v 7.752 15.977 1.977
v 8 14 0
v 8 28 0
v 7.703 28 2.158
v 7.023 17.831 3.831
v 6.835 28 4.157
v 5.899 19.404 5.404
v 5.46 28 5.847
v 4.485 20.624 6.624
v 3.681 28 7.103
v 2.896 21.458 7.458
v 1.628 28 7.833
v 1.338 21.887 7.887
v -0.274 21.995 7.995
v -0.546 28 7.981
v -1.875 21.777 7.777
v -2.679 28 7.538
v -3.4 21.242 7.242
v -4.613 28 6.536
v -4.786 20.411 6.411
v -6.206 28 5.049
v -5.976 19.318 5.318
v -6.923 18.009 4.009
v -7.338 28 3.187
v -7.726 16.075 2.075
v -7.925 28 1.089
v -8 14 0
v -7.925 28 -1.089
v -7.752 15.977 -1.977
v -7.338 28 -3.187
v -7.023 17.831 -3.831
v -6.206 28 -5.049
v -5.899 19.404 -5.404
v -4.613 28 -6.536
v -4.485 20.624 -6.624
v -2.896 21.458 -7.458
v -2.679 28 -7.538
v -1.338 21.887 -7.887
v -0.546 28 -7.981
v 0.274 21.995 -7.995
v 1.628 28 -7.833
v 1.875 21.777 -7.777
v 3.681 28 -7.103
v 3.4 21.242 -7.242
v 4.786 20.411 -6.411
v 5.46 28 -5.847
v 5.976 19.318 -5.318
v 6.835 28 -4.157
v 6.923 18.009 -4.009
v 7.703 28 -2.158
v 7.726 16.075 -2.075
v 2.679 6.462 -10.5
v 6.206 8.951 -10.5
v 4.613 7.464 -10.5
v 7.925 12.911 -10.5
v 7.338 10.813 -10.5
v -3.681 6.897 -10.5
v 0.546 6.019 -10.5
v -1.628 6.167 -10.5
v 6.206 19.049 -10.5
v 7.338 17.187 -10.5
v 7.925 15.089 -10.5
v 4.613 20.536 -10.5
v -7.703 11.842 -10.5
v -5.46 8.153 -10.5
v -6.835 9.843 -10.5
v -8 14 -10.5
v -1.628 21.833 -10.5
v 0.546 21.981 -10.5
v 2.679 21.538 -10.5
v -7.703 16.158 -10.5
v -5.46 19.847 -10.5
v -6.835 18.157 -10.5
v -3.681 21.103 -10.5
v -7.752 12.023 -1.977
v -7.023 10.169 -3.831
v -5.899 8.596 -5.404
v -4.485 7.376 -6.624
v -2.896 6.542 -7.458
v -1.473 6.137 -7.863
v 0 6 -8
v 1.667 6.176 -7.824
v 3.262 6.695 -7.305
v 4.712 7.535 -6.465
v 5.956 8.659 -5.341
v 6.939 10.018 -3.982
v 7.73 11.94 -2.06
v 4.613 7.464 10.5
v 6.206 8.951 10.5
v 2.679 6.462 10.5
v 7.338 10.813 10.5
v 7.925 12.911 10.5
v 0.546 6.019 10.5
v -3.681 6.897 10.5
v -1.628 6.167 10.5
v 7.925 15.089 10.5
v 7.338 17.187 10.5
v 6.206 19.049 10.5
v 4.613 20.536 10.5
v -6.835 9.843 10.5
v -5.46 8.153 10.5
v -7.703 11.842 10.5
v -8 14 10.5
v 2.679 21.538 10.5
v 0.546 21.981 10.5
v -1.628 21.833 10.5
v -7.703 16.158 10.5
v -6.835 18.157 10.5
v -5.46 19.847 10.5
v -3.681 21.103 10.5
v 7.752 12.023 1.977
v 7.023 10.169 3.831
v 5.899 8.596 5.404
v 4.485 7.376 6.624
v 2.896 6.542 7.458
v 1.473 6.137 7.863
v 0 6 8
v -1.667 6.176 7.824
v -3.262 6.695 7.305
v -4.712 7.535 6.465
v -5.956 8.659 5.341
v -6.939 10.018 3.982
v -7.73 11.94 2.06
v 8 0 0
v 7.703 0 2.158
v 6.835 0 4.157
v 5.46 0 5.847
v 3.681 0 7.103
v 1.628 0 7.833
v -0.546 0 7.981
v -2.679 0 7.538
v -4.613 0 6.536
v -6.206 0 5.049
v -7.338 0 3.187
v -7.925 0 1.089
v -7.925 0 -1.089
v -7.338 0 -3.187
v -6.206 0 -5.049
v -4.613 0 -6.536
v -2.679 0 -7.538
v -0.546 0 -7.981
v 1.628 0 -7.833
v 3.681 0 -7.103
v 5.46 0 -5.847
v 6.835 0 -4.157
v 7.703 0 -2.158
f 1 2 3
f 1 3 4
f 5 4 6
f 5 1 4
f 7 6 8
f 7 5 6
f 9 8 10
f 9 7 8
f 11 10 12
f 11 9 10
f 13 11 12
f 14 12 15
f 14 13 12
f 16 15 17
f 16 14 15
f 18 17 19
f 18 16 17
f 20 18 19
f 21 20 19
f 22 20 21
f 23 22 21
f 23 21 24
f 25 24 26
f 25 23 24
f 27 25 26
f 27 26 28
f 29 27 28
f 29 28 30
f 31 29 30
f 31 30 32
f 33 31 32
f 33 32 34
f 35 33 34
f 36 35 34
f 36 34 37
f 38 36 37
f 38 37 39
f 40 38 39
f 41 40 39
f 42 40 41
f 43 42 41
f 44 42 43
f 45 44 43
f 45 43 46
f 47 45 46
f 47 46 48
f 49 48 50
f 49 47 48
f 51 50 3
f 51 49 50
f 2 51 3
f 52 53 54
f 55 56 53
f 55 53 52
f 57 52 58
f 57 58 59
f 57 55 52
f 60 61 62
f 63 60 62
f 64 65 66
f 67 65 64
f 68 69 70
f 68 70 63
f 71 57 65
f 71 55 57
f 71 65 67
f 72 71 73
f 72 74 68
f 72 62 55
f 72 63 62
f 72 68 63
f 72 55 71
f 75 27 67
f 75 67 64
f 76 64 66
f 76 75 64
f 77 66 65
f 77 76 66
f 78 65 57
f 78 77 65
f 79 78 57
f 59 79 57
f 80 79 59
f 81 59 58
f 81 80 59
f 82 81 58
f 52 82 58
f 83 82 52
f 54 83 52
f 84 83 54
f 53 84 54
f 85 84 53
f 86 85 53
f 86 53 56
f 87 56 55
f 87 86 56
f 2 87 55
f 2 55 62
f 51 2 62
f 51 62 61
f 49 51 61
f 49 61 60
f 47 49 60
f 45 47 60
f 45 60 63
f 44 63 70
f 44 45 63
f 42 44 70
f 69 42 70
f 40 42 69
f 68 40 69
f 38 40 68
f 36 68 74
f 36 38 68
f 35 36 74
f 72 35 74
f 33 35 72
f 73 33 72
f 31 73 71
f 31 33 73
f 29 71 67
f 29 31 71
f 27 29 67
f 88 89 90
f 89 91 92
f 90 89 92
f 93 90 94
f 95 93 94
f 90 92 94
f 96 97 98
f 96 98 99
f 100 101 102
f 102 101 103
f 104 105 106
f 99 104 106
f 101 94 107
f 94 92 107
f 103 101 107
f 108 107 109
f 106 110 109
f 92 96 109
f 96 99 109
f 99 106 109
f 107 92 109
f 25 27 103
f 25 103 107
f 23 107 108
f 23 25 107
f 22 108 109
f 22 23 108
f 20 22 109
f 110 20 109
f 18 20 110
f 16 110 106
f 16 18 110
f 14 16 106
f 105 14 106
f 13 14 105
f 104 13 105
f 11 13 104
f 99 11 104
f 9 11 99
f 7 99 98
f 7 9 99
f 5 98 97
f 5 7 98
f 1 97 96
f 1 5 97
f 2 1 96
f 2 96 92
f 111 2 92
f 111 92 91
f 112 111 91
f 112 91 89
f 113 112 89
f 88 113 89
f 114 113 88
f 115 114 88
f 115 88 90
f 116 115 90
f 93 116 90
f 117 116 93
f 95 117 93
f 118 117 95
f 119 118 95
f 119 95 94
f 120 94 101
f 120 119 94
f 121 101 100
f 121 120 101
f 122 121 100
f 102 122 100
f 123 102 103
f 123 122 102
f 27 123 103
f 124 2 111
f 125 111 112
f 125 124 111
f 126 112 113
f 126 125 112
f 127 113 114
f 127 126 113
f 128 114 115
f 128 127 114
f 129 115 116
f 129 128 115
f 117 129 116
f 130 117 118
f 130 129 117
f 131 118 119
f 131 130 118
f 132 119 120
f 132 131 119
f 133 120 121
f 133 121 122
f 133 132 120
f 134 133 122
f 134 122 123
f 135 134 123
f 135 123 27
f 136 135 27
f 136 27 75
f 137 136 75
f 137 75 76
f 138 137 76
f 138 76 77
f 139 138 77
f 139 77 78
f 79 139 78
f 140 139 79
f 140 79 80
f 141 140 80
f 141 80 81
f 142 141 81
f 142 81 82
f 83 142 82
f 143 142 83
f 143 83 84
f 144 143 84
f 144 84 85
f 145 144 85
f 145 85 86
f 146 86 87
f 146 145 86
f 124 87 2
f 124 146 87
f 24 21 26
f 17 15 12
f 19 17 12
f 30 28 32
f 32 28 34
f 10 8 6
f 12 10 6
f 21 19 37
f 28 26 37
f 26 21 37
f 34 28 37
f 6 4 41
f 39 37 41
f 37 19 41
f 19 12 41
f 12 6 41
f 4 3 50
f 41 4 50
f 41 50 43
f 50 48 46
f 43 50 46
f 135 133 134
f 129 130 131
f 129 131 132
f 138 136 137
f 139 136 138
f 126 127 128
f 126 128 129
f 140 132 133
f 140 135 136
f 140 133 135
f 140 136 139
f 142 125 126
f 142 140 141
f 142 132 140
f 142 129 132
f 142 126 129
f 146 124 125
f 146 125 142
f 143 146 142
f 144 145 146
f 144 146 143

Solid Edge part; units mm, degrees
sketch "Sketch1" plane through (0, 0, 0) normal (0, -1, 0) x (1, 0, 0)
  circle A0 centre (0, 0) radius 8
extrude "Protrusion1" add sketch "Sketch1" against normal blind 28
sketch "Sketch2" plane through (0, 0, 0) normal (0, 0, -1) x (-1, 0, 0)
  circle A0 centre (0, 14) radius 8
extrude "ExtrudedProtrusion_2" add sketch "Sketch2" along normal blind 10.5
sketch "Sketch3" plane through (0, 0, 0) normal (0, 0, -1) x (-1, 0, 0)
  circle A0 centre (0, 14) radius 8
extrude "ExtrudedProtrusion_3" add sketch "Sketch3" against normal blind 10.5
